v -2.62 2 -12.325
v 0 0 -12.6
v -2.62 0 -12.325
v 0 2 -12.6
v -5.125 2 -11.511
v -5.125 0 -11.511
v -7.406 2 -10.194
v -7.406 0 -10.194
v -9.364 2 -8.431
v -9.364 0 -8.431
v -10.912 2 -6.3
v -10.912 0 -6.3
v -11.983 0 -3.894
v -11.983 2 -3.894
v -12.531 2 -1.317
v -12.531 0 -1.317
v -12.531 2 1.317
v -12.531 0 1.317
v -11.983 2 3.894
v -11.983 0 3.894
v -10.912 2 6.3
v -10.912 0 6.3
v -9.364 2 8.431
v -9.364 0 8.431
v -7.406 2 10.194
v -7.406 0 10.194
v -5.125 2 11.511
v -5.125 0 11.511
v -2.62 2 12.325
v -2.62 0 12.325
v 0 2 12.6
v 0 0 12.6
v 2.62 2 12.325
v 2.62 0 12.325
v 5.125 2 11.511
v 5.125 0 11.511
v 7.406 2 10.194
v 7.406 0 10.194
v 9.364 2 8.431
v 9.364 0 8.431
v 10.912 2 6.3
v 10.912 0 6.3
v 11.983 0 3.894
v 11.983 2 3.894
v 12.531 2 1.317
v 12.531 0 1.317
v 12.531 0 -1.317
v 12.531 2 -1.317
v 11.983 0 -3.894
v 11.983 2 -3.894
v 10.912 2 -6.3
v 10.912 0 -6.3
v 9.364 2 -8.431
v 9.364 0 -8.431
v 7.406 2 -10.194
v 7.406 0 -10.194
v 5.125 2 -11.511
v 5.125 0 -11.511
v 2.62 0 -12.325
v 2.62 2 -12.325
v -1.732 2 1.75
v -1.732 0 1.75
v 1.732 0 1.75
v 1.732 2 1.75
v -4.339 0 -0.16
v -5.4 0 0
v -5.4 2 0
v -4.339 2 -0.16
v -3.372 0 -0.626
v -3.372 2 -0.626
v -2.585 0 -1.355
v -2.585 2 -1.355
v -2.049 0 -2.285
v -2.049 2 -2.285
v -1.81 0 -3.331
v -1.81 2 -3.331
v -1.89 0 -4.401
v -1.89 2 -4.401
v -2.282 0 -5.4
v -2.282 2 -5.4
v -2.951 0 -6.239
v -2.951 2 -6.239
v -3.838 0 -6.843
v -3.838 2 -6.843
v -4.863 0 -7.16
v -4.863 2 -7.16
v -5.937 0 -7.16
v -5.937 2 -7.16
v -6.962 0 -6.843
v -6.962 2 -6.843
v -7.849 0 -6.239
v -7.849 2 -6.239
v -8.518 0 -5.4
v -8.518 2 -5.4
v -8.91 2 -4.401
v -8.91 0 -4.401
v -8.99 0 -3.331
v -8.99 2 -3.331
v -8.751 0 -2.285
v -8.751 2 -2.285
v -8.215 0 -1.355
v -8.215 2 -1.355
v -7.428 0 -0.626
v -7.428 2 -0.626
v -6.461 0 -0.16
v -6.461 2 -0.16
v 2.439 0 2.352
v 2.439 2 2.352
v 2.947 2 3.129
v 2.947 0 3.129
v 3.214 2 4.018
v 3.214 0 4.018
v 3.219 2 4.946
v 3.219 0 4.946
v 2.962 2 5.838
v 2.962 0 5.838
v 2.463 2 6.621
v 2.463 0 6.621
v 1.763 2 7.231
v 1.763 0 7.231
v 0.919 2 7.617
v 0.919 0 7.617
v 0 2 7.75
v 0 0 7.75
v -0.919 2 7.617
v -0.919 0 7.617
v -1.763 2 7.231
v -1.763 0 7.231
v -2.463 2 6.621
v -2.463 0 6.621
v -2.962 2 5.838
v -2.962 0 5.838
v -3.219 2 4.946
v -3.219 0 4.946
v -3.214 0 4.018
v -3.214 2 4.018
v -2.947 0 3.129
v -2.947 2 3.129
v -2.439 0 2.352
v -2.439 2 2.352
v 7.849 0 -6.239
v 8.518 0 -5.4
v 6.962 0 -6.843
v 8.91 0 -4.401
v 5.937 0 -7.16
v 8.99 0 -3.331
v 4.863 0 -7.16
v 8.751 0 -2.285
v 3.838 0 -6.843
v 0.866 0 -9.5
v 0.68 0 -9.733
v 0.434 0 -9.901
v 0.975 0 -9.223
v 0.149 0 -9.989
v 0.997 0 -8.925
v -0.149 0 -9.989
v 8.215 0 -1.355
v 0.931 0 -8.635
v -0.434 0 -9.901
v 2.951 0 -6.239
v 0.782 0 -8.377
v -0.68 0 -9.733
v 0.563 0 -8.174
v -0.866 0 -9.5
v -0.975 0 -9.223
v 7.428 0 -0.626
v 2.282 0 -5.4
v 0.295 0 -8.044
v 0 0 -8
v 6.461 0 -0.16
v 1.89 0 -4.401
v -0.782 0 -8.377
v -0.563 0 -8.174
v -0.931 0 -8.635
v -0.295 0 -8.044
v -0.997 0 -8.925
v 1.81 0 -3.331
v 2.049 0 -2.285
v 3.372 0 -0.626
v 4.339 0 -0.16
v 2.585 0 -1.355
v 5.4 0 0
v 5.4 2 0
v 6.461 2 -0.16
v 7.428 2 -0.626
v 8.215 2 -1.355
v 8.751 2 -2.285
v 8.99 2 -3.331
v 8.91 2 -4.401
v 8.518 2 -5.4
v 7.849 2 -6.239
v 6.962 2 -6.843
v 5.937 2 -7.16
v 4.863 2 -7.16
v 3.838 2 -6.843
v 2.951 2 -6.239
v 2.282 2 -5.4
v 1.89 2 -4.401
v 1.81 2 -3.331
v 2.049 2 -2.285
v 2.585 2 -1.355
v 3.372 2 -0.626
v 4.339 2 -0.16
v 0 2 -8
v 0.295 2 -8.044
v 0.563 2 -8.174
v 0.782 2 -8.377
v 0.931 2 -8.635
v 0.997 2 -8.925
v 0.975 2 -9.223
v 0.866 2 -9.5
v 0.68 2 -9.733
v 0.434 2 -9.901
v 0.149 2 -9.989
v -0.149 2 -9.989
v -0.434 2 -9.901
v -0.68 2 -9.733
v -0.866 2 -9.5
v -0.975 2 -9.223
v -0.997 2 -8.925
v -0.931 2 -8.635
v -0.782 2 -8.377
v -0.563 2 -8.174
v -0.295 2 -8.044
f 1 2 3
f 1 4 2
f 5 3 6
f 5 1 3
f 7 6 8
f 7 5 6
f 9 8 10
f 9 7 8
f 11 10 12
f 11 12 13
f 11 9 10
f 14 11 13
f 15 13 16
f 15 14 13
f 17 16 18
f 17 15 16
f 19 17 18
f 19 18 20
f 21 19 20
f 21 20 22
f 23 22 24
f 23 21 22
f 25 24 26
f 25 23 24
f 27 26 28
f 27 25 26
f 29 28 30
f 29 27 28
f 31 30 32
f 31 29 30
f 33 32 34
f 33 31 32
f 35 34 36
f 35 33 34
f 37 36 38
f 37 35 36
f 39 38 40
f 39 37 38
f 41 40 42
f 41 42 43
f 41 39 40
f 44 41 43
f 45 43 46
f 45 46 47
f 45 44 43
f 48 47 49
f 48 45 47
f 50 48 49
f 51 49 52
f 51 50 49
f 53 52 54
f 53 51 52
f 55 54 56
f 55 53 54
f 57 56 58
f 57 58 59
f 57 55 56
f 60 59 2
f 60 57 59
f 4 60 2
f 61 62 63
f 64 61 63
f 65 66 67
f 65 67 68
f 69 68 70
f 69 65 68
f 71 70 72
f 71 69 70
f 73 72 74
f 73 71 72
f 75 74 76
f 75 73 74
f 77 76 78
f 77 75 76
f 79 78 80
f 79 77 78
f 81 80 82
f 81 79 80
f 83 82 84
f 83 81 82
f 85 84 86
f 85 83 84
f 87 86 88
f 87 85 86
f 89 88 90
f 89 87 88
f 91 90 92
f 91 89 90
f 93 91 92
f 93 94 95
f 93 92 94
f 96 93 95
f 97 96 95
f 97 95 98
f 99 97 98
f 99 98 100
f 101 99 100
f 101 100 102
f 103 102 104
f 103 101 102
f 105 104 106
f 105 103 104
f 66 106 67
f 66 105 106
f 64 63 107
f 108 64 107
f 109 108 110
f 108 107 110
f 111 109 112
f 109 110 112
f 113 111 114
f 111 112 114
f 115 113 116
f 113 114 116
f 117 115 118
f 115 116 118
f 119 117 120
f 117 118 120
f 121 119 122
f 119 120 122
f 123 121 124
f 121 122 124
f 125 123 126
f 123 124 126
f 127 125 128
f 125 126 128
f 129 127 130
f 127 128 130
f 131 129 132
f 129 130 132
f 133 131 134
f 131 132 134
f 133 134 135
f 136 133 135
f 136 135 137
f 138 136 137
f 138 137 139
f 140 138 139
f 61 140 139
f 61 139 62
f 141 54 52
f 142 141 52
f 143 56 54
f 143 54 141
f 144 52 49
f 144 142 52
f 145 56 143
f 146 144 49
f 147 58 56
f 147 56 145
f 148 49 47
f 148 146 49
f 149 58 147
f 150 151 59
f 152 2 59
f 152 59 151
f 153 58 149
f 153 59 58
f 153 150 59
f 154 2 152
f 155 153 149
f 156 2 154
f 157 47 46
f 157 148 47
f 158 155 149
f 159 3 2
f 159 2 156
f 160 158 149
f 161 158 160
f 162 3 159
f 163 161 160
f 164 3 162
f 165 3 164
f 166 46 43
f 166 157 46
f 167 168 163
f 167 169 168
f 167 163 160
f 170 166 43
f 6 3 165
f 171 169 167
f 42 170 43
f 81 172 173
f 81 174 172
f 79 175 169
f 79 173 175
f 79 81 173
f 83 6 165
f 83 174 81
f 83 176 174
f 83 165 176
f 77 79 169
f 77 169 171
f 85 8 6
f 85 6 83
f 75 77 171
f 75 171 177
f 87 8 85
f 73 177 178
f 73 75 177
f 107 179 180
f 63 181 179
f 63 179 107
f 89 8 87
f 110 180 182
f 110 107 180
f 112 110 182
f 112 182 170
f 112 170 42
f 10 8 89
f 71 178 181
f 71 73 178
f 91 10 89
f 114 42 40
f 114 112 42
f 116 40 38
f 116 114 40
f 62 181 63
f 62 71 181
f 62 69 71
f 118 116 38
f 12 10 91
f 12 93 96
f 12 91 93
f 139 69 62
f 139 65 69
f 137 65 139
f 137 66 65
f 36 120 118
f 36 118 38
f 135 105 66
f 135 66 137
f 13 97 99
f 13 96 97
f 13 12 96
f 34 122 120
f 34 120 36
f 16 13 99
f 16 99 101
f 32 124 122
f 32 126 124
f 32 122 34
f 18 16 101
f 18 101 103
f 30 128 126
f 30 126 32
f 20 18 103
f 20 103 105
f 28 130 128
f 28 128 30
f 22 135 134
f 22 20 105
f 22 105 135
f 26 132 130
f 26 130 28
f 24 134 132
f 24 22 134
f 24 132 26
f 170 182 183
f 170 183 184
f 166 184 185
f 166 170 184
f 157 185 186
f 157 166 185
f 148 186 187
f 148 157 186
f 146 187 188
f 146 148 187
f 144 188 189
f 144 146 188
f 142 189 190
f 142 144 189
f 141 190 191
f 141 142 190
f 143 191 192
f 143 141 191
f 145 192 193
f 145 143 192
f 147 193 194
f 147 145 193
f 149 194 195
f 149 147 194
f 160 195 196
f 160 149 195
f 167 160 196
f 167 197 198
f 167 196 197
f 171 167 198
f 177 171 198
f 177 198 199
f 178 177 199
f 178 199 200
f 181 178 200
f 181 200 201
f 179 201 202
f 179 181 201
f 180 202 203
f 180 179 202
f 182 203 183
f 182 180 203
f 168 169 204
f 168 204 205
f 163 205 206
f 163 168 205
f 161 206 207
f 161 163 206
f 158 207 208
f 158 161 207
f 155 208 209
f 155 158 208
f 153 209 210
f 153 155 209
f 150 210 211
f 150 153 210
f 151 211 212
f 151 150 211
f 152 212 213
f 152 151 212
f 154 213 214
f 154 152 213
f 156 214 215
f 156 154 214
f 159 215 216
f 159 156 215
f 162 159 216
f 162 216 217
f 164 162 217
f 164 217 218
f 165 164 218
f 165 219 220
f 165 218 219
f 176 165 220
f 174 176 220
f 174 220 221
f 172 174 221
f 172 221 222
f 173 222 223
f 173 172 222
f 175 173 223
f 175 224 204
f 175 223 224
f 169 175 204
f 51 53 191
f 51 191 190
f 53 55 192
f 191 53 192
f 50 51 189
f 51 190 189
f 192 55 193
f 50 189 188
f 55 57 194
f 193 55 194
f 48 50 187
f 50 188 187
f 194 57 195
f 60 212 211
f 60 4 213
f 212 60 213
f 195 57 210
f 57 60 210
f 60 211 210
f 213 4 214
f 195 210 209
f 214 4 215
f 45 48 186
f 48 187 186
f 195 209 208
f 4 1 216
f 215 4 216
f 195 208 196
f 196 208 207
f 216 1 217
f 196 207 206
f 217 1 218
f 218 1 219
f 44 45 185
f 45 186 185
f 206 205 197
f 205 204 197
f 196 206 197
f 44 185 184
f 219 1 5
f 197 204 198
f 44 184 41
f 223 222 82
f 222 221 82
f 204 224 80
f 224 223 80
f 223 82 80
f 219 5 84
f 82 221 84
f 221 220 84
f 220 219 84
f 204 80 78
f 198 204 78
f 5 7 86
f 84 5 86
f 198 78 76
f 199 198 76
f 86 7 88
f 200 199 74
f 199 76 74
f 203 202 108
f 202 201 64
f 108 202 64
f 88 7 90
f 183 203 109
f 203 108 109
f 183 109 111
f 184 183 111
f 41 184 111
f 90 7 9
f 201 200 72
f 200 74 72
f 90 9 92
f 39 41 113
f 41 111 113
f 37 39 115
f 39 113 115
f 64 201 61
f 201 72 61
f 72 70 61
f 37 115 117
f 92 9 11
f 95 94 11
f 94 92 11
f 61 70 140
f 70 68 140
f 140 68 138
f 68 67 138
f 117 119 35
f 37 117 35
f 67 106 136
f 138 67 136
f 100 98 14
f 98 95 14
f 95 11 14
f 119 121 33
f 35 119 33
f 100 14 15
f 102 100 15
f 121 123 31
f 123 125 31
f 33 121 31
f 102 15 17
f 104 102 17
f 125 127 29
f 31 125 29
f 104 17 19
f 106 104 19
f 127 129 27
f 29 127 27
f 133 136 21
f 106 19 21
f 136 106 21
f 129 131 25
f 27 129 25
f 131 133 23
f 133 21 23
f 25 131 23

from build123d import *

# Parameters (mm, degrees)
SKETCH1_W                                     = 12.6
SKETCH1_H                                     = 2
FOUR_THROUGH_HOLES_BOTH_DIRECTIONS_DEPTH      = 18.93097878
FOUR_THROUGH_HOLES_BOTH_DIRECTIONS_DEPTH_BACK = 18.93097878
SMA_D6_5_HOSES_D7_2_VENT_D2_R                 = 3.6
SMA_D6_5_HOSES_D7_2_VENT_D2_R_2               = 1


with BuildPart() as part:
    # Sketch1 → Revolve1 (revolve)
    with BuildSketch(Plane.XY, mode=Mode.PRIVATE) as revolve1_sk:
        with Locations((6.3, 1)):
            Rectangle(SKETCH1_W, SKETCH1_H)
    revolve(revolve1_sk.sketch.rotate(Axis((0, -200, 0), (0, 1, 0)), 90), axis=Axis((0, -200, 0), (0, 1, 0)))

    # SMA D6.5 - hoses D7.2 - vent D2 → Four through holes - both directions (cut, two sides: drawn at the far end of the back side and taken through both)
    with BuildSketch(Plane(origin=(0, 0, 0), x_dir=(1, 0, 0), z_dir=(0, 1, 0)).offset(-FOUR_THROUGH_HOLES_BOTH_DIRECTIONS_DEPTH_BACK)):
        with Locations(Location((-5.4, 3.6, 0), (0, 0, 270))):
            Circle(SMA_D6_5_HOSES_D7_2_VENT_D2_R)
        with Locations(Location((5.4, 3.6, 0), (0, 0, 270))):
            Circle(SMA_D6_5_HOSES_D7_2_VENT_D2_R)
        with Locations(Location((0, 9, 0), (0, 0, 270))):
            Circle(SMA_D6_5_HOSES_D7_2_VENT_D2_R_2)
        with BuildLine():
            Line((-1.732050808, -1.75), (1.732050808, -1.75))
            ThreePointArc((1.732050808, -1.75), (0, -7.75), (-1.732050808, -1.75))
        make_face()
    extrude(amount=FOUR_THROUGH_HOLES_BOTH_DIRECTIONS_DEPTH + FOUR_THROUGH_HOLES_BOTH_DIRECTIONS_DEPTH_BACK, mode=Mode.SUBTRACT)


solid = part.part
